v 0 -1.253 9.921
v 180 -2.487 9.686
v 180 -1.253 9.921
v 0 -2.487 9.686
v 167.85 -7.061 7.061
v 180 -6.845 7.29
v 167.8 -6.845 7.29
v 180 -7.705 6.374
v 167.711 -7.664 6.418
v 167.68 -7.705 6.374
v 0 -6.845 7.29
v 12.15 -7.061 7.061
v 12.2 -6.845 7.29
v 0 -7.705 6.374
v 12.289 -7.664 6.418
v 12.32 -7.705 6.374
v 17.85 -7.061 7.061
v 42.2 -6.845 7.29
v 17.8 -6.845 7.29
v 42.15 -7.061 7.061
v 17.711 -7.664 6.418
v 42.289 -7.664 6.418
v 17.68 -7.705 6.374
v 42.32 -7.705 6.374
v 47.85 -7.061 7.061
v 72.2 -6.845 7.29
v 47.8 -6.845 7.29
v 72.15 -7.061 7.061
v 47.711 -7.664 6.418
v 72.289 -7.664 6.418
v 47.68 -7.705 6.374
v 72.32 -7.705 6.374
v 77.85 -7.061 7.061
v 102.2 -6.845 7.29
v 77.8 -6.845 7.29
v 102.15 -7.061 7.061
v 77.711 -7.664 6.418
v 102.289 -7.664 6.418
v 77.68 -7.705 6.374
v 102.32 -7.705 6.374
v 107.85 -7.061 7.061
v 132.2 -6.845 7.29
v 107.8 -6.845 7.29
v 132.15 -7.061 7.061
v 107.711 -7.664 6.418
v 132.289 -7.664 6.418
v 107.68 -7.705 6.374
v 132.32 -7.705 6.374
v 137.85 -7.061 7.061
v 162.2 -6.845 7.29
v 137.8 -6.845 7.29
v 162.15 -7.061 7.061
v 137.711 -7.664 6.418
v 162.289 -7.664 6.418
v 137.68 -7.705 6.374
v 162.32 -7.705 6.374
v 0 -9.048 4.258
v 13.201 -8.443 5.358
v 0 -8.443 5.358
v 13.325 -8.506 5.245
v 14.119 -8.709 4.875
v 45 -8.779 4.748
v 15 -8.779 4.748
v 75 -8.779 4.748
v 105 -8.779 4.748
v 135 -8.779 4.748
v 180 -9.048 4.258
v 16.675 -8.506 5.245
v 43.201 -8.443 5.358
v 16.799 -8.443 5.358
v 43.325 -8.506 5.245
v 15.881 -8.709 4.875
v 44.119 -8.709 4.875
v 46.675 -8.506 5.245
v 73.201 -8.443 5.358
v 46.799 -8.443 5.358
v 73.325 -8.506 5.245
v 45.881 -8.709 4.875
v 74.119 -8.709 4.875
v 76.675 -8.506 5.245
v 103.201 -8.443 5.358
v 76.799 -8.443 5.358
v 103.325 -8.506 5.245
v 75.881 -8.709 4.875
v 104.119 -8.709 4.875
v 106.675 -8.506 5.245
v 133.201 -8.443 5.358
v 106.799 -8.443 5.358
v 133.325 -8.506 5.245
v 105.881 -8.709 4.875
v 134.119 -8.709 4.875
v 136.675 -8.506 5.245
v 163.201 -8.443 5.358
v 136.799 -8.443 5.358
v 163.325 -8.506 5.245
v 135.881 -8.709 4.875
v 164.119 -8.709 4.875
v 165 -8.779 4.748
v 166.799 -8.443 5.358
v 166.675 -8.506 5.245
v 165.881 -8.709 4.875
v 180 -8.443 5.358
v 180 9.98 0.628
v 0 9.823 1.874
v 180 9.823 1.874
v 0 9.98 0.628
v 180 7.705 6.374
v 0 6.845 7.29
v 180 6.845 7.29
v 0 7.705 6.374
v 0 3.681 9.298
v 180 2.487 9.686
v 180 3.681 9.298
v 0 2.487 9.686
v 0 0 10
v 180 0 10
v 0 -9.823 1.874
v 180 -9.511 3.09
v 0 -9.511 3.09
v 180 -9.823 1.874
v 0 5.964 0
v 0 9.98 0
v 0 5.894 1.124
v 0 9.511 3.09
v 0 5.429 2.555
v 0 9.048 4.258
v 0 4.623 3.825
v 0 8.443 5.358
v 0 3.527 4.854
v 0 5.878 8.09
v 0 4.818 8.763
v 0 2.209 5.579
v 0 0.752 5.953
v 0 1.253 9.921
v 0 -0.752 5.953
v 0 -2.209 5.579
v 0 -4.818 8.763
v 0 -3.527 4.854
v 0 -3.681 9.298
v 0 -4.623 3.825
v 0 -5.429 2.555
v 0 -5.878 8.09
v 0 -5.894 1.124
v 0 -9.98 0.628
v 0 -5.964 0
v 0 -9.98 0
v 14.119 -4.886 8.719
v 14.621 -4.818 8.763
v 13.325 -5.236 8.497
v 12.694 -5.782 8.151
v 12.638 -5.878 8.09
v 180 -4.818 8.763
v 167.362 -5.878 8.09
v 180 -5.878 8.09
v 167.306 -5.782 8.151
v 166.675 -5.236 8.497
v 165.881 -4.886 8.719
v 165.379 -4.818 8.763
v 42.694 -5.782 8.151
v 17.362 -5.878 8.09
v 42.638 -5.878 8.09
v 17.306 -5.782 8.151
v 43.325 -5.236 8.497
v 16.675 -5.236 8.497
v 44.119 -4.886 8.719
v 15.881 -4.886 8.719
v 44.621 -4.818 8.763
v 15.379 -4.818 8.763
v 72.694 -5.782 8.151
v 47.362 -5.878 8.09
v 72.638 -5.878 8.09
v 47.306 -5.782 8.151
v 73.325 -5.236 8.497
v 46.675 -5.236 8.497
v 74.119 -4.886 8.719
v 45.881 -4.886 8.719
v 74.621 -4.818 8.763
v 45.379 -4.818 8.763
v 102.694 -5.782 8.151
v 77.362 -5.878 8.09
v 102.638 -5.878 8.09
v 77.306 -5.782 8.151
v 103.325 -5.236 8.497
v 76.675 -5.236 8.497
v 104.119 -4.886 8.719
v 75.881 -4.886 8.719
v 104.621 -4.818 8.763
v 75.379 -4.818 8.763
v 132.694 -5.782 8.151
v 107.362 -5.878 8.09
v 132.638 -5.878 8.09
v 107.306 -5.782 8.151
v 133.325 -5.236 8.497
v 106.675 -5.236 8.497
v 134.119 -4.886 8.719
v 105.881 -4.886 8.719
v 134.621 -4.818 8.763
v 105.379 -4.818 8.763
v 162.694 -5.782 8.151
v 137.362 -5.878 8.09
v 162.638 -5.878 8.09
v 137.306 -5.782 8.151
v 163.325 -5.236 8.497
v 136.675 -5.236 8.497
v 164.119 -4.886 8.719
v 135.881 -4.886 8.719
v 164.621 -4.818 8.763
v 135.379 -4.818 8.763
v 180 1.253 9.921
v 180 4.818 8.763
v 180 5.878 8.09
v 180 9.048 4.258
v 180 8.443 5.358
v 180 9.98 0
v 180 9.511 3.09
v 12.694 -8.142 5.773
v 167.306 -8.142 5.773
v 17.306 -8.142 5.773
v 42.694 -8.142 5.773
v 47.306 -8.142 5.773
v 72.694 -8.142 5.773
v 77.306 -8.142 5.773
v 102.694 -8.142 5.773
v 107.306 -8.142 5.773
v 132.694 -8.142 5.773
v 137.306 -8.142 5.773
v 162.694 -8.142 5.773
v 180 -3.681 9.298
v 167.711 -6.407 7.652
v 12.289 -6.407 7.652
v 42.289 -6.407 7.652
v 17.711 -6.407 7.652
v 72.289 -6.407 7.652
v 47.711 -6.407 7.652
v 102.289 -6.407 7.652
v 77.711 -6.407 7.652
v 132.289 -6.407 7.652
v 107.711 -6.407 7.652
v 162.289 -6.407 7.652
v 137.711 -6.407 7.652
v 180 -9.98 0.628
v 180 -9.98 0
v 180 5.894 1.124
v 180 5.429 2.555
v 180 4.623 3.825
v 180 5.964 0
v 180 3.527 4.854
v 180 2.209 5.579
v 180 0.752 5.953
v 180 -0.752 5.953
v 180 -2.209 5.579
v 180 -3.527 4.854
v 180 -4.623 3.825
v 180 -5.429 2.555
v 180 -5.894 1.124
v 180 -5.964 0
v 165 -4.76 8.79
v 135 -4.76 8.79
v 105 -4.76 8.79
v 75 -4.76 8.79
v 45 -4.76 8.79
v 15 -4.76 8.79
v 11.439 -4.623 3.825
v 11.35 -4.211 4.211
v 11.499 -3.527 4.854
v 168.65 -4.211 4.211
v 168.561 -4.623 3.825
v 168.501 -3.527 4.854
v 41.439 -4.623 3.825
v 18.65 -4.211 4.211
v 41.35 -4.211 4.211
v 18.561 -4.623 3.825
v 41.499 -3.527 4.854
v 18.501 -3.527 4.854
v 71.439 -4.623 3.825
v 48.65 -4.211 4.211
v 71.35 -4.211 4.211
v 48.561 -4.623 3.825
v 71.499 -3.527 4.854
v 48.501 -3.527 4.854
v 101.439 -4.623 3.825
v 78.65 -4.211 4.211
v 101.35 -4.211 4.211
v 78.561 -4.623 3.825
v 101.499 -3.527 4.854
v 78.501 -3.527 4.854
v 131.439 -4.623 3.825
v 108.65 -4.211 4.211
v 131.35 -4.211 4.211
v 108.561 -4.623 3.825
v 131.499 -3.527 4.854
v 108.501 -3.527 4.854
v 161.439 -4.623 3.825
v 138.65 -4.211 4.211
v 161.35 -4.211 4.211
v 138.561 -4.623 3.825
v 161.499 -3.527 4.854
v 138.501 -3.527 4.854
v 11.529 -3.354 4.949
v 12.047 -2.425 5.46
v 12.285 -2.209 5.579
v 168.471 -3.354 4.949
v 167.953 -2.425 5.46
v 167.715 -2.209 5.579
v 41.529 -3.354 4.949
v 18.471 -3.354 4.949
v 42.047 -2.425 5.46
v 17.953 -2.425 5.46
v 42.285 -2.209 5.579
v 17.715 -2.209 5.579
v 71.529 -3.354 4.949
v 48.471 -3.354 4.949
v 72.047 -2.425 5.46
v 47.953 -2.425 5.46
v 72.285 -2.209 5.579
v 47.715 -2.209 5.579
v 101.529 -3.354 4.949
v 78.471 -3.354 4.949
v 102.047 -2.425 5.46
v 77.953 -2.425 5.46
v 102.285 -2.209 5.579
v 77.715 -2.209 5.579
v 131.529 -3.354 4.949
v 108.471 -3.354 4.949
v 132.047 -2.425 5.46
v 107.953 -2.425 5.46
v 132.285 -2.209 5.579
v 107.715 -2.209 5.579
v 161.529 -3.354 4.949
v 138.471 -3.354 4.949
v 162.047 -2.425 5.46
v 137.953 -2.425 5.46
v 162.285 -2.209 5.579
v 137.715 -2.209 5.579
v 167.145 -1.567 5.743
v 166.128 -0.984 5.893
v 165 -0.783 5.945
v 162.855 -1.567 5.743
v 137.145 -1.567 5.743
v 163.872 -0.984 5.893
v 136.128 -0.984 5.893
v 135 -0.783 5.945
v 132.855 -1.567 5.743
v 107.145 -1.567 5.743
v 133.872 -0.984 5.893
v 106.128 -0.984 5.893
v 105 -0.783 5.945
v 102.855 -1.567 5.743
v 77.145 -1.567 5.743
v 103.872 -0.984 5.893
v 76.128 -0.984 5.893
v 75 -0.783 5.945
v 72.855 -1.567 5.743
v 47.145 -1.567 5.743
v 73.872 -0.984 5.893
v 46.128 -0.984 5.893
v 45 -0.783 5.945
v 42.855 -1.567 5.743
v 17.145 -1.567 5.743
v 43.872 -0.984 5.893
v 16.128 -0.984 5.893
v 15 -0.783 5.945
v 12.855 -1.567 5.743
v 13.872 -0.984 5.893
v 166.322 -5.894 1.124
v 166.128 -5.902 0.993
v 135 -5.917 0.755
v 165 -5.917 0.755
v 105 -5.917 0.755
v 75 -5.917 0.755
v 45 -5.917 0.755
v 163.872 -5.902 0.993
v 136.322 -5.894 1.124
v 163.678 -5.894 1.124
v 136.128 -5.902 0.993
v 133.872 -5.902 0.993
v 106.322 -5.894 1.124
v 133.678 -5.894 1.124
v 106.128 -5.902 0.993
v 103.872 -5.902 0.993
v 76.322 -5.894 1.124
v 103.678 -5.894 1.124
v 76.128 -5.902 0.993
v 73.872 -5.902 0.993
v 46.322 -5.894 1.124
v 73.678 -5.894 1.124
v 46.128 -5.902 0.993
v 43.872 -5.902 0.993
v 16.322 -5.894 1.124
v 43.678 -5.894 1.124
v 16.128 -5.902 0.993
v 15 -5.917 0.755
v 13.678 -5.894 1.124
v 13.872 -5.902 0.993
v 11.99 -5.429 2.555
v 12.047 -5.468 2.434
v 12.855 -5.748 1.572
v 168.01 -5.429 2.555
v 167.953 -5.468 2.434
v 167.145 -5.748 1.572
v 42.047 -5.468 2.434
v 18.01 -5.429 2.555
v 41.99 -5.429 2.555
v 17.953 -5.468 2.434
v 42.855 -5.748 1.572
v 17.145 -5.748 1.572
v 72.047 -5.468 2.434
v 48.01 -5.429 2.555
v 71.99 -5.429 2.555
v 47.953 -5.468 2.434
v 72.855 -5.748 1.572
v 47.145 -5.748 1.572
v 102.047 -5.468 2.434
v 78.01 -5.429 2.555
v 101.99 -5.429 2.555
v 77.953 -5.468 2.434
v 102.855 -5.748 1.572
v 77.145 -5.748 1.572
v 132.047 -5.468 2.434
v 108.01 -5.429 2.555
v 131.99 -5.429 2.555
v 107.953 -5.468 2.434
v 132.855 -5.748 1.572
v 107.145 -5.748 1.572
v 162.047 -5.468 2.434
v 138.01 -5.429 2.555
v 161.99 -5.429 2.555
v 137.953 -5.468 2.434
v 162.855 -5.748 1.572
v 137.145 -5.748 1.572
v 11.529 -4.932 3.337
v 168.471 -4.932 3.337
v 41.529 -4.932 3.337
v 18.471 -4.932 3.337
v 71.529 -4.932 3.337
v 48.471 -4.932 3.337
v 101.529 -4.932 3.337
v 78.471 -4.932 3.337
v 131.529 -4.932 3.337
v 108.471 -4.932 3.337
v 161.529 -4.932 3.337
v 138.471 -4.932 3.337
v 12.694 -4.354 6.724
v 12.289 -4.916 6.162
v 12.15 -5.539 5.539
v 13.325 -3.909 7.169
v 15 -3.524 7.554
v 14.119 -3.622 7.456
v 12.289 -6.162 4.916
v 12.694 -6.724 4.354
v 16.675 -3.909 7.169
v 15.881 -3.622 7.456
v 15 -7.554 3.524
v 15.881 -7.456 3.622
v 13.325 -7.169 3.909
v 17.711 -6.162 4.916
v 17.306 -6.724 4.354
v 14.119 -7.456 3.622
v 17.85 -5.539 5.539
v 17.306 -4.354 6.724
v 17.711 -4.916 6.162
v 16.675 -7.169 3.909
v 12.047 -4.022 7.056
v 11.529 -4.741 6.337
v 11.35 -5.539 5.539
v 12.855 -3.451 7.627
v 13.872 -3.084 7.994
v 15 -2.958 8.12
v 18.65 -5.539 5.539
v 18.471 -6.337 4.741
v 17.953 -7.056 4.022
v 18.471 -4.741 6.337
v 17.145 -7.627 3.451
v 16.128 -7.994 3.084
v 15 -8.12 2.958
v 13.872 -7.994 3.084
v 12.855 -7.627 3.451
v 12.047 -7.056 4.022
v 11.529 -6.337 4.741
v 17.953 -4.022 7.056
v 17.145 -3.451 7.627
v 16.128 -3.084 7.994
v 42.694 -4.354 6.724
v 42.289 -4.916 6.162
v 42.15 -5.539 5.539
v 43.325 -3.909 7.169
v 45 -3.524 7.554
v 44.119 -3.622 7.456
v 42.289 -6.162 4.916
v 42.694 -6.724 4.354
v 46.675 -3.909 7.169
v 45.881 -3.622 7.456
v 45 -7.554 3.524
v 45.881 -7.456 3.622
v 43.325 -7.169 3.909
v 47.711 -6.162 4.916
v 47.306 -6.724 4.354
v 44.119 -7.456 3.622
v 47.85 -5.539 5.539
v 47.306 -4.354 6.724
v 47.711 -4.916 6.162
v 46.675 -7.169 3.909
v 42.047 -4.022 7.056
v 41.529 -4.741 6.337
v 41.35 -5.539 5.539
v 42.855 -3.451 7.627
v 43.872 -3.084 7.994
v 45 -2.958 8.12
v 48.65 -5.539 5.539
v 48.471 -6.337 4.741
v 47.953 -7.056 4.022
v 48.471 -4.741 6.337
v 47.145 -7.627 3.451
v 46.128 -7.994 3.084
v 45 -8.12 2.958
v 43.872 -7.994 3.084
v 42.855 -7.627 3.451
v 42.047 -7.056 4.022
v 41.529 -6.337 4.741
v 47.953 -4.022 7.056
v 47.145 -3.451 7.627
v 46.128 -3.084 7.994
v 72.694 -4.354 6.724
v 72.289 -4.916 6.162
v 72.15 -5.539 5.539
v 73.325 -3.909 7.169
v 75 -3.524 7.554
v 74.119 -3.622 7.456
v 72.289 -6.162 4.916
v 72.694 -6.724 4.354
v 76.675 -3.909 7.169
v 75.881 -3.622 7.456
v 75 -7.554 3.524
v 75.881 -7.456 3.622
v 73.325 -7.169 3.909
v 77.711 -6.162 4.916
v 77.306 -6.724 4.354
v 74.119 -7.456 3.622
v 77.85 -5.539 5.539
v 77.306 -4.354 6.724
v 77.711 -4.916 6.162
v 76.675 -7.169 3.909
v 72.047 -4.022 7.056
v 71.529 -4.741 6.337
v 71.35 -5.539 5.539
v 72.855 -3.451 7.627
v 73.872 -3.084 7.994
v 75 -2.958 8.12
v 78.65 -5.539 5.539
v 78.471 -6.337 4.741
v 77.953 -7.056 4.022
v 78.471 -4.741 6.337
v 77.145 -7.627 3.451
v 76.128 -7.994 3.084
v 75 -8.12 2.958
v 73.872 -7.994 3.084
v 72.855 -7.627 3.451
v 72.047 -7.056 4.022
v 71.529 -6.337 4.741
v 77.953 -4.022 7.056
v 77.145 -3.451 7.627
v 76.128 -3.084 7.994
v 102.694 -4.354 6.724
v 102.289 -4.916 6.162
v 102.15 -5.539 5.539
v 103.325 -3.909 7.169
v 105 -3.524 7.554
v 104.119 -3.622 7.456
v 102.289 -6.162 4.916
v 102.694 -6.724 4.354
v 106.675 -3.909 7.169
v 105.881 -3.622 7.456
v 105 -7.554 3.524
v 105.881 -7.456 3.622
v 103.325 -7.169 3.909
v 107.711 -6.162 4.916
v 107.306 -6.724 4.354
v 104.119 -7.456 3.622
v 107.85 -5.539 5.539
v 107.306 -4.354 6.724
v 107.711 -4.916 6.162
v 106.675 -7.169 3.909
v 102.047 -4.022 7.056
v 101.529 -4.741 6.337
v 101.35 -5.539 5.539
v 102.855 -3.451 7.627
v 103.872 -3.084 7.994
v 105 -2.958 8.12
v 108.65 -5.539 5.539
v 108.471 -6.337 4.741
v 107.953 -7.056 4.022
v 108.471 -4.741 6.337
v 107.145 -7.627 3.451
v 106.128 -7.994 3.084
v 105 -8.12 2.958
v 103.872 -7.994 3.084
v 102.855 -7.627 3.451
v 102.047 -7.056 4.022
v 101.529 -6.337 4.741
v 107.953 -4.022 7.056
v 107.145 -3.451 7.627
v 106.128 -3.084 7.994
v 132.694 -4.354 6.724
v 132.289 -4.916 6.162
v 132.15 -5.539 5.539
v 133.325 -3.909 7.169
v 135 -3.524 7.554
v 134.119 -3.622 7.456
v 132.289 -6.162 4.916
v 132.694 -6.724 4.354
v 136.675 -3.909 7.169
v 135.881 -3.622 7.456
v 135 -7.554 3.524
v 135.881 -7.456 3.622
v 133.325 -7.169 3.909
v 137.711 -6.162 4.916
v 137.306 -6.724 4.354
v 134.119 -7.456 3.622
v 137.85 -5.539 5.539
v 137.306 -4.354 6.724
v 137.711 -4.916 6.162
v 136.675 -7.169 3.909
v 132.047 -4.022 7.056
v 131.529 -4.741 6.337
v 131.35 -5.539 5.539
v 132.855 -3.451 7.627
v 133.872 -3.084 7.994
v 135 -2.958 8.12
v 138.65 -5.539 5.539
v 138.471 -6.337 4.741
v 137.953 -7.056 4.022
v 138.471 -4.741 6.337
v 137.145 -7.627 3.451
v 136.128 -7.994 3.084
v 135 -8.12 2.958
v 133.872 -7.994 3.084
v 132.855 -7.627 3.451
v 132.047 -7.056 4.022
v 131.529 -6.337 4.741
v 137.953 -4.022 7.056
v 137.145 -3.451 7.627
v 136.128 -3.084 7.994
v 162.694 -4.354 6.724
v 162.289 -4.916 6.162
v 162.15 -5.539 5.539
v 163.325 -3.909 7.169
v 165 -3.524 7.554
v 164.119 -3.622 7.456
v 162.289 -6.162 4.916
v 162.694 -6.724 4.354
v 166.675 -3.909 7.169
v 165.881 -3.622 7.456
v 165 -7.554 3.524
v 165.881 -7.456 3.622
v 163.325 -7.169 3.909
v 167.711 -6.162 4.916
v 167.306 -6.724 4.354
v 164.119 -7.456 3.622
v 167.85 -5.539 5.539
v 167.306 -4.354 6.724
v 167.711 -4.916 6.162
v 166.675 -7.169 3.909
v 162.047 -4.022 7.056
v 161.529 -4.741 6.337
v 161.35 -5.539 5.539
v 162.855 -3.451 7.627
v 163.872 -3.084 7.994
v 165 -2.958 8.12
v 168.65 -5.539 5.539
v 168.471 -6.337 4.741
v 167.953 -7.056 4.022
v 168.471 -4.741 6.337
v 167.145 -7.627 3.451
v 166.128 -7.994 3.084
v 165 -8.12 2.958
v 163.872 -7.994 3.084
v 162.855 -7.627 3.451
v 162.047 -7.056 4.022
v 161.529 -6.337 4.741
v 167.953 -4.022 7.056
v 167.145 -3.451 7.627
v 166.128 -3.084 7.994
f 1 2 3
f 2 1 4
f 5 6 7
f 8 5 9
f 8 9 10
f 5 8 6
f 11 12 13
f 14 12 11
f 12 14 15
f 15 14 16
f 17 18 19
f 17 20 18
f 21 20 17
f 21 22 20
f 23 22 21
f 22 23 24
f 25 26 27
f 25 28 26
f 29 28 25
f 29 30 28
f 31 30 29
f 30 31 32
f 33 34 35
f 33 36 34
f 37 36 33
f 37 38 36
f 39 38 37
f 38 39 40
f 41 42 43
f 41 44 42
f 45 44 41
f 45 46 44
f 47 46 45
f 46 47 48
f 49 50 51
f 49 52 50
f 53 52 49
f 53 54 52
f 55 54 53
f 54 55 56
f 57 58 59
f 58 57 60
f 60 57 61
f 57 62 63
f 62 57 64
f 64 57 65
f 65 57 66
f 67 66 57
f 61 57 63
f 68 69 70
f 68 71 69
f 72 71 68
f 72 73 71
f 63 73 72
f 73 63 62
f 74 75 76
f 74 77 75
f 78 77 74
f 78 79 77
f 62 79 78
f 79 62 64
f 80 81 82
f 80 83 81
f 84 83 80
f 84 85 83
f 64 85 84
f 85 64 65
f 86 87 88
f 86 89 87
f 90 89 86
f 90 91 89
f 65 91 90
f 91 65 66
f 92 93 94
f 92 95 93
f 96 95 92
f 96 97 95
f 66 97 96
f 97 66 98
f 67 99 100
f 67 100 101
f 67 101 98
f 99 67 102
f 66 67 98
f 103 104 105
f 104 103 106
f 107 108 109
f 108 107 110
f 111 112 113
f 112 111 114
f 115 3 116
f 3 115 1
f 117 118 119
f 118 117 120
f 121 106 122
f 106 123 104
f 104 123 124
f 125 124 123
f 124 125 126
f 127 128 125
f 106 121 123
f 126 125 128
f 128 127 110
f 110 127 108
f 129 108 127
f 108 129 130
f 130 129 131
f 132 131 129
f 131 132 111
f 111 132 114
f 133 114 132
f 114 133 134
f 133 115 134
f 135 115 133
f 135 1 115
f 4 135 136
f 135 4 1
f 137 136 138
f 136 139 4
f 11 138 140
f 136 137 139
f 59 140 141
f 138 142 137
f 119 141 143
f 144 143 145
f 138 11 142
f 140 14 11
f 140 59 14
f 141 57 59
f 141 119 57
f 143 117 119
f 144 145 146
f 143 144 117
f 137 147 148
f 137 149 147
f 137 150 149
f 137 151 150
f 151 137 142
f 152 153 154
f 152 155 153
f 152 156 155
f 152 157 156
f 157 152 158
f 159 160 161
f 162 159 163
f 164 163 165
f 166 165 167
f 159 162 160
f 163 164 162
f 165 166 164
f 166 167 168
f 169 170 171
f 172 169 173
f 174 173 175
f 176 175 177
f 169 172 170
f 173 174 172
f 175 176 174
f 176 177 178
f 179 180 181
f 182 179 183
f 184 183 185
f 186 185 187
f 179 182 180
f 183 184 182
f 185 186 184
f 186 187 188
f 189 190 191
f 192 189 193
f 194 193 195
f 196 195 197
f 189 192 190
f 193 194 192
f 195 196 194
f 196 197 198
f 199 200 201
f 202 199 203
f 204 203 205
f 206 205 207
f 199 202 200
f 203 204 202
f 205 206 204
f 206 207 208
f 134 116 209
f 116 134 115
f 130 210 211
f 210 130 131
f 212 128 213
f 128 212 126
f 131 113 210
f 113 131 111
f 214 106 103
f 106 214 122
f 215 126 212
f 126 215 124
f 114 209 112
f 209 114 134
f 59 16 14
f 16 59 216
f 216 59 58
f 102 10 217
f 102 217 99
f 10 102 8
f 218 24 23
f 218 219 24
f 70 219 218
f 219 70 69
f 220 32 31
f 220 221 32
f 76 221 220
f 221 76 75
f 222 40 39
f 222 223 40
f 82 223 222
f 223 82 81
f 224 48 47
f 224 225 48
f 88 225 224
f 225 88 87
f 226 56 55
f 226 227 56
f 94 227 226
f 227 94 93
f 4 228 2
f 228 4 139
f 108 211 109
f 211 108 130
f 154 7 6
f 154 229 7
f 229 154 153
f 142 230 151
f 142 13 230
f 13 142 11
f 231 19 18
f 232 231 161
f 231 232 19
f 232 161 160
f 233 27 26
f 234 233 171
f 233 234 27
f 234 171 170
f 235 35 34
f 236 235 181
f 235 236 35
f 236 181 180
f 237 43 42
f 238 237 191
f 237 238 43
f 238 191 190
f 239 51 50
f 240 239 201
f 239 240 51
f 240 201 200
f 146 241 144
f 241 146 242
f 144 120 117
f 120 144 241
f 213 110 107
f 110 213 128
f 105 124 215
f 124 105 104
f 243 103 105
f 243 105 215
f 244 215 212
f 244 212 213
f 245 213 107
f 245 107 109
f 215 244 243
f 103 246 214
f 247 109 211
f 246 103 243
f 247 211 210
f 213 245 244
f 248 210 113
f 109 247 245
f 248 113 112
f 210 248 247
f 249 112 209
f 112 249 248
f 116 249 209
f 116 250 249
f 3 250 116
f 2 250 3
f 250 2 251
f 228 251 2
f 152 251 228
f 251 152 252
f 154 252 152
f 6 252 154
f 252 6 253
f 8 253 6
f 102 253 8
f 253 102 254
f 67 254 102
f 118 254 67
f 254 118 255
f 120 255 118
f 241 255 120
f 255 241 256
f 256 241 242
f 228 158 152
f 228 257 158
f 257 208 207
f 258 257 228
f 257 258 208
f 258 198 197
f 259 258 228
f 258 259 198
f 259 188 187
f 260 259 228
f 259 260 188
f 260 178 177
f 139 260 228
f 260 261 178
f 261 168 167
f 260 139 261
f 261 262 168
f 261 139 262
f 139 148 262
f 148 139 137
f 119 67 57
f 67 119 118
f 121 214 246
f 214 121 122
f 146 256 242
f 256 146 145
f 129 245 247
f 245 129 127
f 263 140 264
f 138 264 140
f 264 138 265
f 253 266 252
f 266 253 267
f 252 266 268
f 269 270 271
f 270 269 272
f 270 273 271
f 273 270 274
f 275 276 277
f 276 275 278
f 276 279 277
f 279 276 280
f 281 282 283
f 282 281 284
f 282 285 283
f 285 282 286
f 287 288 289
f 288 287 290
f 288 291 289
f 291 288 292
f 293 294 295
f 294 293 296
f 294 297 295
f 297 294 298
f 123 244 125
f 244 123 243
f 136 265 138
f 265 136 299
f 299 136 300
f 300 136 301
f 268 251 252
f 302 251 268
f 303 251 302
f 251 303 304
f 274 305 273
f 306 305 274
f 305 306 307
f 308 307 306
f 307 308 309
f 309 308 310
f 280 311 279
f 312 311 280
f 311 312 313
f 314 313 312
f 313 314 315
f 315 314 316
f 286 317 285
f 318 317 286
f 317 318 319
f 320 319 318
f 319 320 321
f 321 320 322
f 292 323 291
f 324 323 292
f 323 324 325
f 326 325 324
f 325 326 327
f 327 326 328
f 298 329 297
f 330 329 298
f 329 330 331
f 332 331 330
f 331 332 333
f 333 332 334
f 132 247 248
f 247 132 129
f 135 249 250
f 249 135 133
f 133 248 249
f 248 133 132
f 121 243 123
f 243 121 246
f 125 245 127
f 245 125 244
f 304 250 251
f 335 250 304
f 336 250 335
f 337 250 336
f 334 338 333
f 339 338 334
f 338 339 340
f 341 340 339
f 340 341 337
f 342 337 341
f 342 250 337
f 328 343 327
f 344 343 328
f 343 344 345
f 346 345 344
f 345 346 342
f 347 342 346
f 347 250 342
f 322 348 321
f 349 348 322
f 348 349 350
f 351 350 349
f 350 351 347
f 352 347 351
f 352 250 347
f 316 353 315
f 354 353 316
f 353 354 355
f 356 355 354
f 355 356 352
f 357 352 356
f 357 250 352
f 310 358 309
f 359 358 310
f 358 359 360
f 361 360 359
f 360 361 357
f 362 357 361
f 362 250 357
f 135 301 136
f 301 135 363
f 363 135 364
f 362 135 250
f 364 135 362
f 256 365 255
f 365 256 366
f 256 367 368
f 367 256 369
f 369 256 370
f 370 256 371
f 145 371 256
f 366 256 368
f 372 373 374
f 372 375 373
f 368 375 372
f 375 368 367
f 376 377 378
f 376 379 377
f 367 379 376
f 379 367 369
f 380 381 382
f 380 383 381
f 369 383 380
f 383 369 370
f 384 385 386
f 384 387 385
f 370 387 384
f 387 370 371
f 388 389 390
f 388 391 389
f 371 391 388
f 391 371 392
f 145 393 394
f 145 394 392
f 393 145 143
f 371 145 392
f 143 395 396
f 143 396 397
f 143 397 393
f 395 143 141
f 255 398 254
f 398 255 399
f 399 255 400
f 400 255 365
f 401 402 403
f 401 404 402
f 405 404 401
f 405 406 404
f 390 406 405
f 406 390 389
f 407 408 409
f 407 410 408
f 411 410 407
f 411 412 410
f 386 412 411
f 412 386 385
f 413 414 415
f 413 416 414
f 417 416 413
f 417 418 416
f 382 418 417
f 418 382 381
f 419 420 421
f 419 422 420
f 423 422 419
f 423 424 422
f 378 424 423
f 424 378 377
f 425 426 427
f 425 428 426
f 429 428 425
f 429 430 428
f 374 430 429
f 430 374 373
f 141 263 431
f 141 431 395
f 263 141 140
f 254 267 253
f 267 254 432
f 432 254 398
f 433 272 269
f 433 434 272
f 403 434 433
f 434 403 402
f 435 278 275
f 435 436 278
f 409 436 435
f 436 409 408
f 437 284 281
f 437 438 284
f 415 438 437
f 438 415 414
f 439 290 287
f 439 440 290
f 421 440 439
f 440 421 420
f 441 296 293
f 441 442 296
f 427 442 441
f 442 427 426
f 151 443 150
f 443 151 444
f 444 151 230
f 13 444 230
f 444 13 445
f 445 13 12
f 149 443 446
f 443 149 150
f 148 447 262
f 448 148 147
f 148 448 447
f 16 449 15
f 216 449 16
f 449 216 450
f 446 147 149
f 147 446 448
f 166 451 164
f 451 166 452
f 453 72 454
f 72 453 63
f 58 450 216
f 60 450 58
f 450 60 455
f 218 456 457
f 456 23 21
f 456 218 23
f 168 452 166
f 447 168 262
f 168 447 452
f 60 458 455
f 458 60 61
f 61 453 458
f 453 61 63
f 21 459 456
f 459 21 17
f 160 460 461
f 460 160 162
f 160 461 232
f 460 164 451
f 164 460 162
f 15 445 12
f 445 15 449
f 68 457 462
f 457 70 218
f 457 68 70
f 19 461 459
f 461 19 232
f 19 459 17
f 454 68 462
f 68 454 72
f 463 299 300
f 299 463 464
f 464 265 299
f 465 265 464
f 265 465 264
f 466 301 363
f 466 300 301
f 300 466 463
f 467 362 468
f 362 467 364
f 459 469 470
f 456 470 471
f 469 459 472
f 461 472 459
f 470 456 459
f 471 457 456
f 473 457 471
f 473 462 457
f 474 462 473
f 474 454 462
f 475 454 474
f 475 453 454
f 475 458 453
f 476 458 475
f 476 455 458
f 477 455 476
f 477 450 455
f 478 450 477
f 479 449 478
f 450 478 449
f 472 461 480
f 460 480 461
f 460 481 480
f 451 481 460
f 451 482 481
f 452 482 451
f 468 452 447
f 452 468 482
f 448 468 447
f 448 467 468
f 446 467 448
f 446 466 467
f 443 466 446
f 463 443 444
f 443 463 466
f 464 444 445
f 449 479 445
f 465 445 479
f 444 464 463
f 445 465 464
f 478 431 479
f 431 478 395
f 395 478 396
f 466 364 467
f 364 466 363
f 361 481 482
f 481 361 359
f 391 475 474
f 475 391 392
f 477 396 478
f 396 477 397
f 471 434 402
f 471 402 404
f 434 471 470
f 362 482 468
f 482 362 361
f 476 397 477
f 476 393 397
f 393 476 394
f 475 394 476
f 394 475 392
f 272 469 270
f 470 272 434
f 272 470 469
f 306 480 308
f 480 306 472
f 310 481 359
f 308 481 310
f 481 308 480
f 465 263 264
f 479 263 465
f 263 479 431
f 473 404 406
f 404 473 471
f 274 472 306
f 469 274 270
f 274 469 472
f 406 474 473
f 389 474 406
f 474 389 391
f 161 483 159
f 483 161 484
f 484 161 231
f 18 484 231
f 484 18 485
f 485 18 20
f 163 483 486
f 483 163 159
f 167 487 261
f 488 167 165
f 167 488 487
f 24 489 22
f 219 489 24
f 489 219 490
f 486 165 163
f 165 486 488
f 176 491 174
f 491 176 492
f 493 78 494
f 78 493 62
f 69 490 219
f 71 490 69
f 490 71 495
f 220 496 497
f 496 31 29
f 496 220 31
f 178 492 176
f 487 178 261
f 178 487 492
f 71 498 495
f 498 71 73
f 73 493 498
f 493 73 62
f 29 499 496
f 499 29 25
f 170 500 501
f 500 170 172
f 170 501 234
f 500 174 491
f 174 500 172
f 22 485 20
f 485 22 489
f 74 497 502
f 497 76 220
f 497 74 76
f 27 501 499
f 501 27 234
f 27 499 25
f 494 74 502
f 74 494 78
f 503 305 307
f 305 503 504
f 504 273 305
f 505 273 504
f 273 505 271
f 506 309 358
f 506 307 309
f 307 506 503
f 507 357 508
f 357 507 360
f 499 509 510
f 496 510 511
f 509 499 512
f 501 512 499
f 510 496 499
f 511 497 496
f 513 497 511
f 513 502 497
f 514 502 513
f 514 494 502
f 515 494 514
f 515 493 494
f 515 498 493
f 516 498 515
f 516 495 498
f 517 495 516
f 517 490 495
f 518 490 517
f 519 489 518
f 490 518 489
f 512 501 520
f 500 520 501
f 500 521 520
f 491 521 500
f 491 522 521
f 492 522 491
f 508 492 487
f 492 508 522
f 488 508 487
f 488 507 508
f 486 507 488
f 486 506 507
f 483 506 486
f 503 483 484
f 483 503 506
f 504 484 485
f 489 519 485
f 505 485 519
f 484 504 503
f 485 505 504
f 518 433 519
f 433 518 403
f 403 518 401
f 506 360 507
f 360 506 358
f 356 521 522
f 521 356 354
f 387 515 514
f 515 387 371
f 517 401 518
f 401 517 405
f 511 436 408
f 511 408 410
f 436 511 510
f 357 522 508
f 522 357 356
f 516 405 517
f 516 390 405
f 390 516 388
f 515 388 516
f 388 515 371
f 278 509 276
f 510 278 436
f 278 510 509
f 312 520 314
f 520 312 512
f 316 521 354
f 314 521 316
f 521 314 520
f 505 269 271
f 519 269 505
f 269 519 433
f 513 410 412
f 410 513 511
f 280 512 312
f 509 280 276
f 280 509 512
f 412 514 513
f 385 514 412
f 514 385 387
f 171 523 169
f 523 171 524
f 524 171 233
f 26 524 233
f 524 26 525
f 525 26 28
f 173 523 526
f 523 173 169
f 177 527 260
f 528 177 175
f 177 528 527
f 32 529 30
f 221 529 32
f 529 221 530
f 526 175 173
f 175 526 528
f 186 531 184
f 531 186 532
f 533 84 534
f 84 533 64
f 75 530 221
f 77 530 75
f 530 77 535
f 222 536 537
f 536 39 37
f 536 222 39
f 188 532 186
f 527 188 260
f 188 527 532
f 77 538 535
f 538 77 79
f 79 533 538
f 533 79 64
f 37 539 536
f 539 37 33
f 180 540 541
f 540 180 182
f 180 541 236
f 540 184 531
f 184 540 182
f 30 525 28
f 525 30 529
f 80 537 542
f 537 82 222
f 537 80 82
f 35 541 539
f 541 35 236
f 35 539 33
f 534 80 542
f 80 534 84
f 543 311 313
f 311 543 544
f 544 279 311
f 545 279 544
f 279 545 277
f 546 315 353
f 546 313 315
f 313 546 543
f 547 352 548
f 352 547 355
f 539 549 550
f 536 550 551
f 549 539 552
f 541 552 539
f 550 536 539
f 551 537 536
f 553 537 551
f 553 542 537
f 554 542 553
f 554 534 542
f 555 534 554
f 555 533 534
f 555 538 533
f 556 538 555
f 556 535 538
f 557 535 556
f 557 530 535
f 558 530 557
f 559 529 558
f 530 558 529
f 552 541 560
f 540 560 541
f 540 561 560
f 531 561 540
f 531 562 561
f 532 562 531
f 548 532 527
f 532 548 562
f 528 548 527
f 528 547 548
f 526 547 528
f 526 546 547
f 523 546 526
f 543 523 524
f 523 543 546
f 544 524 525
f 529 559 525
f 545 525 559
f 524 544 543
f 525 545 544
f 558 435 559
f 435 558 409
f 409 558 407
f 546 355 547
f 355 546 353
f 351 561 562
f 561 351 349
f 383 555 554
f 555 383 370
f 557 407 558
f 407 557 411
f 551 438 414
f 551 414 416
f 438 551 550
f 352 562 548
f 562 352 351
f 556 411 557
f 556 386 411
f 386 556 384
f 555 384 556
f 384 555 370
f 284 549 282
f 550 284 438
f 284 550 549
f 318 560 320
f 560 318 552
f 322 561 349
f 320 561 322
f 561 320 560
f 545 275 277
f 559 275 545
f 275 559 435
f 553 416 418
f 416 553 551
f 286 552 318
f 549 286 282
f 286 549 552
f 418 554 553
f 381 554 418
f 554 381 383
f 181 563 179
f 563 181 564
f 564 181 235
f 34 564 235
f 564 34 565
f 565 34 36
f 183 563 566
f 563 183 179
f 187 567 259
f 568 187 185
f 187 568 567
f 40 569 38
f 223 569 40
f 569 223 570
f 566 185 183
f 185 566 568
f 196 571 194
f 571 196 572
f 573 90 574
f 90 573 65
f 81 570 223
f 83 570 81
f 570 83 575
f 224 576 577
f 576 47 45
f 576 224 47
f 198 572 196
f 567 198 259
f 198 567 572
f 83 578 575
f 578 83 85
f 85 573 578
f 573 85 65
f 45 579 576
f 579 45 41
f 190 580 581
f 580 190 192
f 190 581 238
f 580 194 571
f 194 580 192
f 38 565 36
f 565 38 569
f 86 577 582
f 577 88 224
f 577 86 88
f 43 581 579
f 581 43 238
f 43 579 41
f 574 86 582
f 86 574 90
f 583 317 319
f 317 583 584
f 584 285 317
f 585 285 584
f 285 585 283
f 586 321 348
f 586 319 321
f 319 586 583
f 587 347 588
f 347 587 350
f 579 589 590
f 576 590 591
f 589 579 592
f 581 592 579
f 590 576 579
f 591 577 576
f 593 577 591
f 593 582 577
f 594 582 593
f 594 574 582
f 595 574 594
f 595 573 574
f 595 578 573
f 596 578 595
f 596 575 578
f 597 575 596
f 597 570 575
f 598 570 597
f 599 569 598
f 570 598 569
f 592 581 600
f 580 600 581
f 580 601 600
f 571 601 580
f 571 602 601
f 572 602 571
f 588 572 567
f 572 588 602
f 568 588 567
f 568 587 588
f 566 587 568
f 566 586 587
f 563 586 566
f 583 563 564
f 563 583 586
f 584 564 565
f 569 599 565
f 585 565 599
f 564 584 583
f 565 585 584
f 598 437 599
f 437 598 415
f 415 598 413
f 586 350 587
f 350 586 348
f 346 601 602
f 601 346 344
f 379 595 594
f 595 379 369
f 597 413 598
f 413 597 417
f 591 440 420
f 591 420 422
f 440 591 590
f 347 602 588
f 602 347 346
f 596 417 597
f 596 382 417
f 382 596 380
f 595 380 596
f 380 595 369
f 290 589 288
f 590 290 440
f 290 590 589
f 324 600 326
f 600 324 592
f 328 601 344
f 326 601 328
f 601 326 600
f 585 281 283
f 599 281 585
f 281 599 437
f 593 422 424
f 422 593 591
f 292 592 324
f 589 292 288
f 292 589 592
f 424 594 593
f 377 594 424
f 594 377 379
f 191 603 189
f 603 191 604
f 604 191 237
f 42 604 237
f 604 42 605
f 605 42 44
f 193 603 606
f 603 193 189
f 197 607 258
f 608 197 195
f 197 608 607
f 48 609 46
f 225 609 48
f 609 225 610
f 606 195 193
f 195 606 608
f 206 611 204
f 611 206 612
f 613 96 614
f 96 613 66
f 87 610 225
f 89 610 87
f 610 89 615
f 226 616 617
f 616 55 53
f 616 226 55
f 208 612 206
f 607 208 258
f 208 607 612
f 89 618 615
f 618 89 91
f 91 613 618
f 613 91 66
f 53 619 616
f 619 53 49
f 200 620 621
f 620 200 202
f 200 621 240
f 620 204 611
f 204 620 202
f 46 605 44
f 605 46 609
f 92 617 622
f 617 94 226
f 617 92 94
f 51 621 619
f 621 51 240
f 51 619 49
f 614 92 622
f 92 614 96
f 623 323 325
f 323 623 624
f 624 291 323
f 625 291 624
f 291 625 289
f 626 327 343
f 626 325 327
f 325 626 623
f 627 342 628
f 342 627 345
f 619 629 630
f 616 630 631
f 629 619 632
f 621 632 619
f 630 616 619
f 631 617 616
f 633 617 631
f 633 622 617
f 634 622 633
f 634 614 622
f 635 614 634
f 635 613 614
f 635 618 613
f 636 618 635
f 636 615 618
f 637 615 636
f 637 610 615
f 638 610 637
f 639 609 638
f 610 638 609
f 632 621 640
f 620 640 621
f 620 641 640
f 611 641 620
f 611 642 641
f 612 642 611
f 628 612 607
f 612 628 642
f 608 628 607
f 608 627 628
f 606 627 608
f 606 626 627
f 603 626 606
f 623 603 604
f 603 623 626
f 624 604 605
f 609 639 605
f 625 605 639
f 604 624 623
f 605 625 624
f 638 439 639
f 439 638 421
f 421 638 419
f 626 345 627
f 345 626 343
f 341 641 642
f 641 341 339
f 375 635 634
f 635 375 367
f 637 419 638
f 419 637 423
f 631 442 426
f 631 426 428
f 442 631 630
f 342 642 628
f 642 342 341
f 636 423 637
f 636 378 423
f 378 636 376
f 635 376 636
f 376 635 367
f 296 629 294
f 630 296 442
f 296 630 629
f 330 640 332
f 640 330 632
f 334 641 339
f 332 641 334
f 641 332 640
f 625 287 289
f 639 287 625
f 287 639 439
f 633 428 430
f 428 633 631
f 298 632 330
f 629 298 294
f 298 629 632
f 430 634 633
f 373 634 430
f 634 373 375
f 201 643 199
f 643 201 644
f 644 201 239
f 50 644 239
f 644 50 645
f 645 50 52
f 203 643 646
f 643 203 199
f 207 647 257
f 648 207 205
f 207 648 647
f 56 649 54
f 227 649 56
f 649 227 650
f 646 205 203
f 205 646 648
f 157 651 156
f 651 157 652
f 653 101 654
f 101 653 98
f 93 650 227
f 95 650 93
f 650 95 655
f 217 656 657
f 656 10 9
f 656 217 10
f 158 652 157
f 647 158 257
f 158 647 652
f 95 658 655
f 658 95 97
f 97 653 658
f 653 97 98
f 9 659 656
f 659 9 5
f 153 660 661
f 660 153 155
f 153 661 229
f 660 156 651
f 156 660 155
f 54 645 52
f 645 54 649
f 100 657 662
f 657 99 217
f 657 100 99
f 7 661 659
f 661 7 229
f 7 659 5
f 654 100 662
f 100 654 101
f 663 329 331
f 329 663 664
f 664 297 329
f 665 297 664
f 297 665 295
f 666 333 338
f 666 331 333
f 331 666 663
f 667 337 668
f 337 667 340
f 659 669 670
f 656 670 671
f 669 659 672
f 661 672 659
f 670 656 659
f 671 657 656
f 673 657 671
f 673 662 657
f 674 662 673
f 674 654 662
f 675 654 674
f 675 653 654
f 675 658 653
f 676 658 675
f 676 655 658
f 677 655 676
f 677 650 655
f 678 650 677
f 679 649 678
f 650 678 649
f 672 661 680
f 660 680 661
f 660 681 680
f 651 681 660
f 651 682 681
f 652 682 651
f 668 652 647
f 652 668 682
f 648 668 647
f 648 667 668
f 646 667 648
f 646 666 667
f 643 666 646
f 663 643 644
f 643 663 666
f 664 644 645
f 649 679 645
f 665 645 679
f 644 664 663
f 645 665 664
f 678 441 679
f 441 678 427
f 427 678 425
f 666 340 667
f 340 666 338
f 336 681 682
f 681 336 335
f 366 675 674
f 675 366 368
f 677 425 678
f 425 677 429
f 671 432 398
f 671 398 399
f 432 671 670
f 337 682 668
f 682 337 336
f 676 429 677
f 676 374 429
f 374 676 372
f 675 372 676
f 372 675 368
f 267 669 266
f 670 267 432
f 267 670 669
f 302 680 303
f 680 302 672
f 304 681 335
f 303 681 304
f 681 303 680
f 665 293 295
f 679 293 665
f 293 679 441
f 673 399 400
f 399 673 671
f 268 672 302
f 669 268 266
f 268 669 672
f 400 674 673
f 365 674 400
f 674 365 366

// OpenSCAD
// [FL_INDEX: keywords="openscad, 3d_parametric, LED_Light_Bar_for_MakerGear_M2, csg_solid" | COT="Parametric OpenSCAD design from 3DCodeverse"]
// Title: LED Light Bar for MakerGear M2

/* LED Light Bar for MakerGear M2
   Version 1.0
   by Kirk Saathoff
   2013-06-06
 */

diameter = 20;
length = 180;
LED_Count = 6;
ledRotation = 45;

/* [Hidden] */
ledDiam = 5;
ledDiam2 = 6;
ledLen = 8.76;


module led()
{
	color("red") {
	sphere(r=ledDiam/2, $fn=25);
	cylinder(h=ledLen-(ledDiam/2), r=ledDiam/2, $fn=25);
	translate([0, 0, ledLen-(ledDiam/2)-1])
		cylinder(h=1, r=ledDiam2/2, $fn=25);
	}
	translate([0, 1, 0])
		cube([.25, .25, 25]);
	translate([0, -1, 0])
		cube([.25, .25, 25]);
}


module lightBar(showLEDs)
{
	spacing = length / LED_Count;
	//union()
	difference()
	{
		difference()
		{
		//	union()
			difference()
			{
				cylinder(h=length, r=diameter/2, $fn=50);
				translate([0, -diameter/2, -.02]) {
					cube([diameter/2, diameter, length+.04]);
				}
			}
			translate([0, 0, -.02])
				cylinder(h=length+.04, r=(diameter/2)-4, $fn=25);
		}
		for (ledHoleNum = [1:LED_Count]) {
			translate([0, 0, ((ledHoleNum-1)*spacing)+(spacing/2)])
				rotate([0, 90, ledRotation])
					translate([0, 0, -diameter/1.5]) {
						cylinder(h=10, r=5.7/2, $fn=20);
						translate([0, 0, 5.5]) {
							cylinder(h=5, r=7.3/2, $fn=20);
						}
					}
		}
	}
	if (showLEDs) {
		for (ledHoleNum = [1:LED_Count]) {
			translate([0, 0, ((ledHoleNum-1)*spacing)+(spacing/2)])
				rotate([0, 90, ledRotation])
					translate([0, 0, -diameter/2])
						led();
		}
	}
}

showLEDs = 0;
showTestLED = 0;

rotate([0, 90, 0])
	lightBar(showLEDs);

if (showTestLED) {
	translate([50, 50, 0])
		led();
}
